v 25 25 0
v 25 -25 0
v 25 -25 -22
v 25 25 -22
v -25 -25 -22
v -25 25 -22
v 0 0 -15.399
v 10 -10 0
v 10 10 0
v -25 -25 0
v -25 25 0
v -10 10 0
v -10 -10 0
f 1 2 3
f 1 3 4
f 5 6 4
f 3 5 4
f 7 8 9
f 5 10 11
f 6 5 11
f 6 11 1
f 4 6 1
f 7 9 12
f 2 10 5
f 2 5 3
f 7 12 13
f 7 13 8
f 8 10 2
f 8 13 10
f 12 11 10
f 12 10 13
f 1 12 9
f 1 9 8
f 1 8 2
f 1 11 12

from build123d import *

# Parameters (mm, degrees)
F0_W     = 50
F0_H     = 50
F2_DEPTH = 22
F1_W     = 20
F1_H     = 20


# Not quite as in the source:
# - an extrude whose draft closes it to a point is written as a loft to that point


with BuildPart() as f2:
    # F0 (on Top) → F2 (new body)
    with BuildSketch(Plane.XY):
        Rectangle(F0_W, F0_H)
    extrude(amount=-F2_DEPTH)

    # F1 (on Top) → F3 section 0
    with BuildSketch(Plane.XY, mode=Mode.PRIVATE) as f3_s0:
        Rectangle(F1_W, F1_H)
    loft([f3_s0.sketch, Vertex(0, 0, -15.3986496381)], ruled=True, mode=Mode.SUBTRACT)


solid = f2.part
